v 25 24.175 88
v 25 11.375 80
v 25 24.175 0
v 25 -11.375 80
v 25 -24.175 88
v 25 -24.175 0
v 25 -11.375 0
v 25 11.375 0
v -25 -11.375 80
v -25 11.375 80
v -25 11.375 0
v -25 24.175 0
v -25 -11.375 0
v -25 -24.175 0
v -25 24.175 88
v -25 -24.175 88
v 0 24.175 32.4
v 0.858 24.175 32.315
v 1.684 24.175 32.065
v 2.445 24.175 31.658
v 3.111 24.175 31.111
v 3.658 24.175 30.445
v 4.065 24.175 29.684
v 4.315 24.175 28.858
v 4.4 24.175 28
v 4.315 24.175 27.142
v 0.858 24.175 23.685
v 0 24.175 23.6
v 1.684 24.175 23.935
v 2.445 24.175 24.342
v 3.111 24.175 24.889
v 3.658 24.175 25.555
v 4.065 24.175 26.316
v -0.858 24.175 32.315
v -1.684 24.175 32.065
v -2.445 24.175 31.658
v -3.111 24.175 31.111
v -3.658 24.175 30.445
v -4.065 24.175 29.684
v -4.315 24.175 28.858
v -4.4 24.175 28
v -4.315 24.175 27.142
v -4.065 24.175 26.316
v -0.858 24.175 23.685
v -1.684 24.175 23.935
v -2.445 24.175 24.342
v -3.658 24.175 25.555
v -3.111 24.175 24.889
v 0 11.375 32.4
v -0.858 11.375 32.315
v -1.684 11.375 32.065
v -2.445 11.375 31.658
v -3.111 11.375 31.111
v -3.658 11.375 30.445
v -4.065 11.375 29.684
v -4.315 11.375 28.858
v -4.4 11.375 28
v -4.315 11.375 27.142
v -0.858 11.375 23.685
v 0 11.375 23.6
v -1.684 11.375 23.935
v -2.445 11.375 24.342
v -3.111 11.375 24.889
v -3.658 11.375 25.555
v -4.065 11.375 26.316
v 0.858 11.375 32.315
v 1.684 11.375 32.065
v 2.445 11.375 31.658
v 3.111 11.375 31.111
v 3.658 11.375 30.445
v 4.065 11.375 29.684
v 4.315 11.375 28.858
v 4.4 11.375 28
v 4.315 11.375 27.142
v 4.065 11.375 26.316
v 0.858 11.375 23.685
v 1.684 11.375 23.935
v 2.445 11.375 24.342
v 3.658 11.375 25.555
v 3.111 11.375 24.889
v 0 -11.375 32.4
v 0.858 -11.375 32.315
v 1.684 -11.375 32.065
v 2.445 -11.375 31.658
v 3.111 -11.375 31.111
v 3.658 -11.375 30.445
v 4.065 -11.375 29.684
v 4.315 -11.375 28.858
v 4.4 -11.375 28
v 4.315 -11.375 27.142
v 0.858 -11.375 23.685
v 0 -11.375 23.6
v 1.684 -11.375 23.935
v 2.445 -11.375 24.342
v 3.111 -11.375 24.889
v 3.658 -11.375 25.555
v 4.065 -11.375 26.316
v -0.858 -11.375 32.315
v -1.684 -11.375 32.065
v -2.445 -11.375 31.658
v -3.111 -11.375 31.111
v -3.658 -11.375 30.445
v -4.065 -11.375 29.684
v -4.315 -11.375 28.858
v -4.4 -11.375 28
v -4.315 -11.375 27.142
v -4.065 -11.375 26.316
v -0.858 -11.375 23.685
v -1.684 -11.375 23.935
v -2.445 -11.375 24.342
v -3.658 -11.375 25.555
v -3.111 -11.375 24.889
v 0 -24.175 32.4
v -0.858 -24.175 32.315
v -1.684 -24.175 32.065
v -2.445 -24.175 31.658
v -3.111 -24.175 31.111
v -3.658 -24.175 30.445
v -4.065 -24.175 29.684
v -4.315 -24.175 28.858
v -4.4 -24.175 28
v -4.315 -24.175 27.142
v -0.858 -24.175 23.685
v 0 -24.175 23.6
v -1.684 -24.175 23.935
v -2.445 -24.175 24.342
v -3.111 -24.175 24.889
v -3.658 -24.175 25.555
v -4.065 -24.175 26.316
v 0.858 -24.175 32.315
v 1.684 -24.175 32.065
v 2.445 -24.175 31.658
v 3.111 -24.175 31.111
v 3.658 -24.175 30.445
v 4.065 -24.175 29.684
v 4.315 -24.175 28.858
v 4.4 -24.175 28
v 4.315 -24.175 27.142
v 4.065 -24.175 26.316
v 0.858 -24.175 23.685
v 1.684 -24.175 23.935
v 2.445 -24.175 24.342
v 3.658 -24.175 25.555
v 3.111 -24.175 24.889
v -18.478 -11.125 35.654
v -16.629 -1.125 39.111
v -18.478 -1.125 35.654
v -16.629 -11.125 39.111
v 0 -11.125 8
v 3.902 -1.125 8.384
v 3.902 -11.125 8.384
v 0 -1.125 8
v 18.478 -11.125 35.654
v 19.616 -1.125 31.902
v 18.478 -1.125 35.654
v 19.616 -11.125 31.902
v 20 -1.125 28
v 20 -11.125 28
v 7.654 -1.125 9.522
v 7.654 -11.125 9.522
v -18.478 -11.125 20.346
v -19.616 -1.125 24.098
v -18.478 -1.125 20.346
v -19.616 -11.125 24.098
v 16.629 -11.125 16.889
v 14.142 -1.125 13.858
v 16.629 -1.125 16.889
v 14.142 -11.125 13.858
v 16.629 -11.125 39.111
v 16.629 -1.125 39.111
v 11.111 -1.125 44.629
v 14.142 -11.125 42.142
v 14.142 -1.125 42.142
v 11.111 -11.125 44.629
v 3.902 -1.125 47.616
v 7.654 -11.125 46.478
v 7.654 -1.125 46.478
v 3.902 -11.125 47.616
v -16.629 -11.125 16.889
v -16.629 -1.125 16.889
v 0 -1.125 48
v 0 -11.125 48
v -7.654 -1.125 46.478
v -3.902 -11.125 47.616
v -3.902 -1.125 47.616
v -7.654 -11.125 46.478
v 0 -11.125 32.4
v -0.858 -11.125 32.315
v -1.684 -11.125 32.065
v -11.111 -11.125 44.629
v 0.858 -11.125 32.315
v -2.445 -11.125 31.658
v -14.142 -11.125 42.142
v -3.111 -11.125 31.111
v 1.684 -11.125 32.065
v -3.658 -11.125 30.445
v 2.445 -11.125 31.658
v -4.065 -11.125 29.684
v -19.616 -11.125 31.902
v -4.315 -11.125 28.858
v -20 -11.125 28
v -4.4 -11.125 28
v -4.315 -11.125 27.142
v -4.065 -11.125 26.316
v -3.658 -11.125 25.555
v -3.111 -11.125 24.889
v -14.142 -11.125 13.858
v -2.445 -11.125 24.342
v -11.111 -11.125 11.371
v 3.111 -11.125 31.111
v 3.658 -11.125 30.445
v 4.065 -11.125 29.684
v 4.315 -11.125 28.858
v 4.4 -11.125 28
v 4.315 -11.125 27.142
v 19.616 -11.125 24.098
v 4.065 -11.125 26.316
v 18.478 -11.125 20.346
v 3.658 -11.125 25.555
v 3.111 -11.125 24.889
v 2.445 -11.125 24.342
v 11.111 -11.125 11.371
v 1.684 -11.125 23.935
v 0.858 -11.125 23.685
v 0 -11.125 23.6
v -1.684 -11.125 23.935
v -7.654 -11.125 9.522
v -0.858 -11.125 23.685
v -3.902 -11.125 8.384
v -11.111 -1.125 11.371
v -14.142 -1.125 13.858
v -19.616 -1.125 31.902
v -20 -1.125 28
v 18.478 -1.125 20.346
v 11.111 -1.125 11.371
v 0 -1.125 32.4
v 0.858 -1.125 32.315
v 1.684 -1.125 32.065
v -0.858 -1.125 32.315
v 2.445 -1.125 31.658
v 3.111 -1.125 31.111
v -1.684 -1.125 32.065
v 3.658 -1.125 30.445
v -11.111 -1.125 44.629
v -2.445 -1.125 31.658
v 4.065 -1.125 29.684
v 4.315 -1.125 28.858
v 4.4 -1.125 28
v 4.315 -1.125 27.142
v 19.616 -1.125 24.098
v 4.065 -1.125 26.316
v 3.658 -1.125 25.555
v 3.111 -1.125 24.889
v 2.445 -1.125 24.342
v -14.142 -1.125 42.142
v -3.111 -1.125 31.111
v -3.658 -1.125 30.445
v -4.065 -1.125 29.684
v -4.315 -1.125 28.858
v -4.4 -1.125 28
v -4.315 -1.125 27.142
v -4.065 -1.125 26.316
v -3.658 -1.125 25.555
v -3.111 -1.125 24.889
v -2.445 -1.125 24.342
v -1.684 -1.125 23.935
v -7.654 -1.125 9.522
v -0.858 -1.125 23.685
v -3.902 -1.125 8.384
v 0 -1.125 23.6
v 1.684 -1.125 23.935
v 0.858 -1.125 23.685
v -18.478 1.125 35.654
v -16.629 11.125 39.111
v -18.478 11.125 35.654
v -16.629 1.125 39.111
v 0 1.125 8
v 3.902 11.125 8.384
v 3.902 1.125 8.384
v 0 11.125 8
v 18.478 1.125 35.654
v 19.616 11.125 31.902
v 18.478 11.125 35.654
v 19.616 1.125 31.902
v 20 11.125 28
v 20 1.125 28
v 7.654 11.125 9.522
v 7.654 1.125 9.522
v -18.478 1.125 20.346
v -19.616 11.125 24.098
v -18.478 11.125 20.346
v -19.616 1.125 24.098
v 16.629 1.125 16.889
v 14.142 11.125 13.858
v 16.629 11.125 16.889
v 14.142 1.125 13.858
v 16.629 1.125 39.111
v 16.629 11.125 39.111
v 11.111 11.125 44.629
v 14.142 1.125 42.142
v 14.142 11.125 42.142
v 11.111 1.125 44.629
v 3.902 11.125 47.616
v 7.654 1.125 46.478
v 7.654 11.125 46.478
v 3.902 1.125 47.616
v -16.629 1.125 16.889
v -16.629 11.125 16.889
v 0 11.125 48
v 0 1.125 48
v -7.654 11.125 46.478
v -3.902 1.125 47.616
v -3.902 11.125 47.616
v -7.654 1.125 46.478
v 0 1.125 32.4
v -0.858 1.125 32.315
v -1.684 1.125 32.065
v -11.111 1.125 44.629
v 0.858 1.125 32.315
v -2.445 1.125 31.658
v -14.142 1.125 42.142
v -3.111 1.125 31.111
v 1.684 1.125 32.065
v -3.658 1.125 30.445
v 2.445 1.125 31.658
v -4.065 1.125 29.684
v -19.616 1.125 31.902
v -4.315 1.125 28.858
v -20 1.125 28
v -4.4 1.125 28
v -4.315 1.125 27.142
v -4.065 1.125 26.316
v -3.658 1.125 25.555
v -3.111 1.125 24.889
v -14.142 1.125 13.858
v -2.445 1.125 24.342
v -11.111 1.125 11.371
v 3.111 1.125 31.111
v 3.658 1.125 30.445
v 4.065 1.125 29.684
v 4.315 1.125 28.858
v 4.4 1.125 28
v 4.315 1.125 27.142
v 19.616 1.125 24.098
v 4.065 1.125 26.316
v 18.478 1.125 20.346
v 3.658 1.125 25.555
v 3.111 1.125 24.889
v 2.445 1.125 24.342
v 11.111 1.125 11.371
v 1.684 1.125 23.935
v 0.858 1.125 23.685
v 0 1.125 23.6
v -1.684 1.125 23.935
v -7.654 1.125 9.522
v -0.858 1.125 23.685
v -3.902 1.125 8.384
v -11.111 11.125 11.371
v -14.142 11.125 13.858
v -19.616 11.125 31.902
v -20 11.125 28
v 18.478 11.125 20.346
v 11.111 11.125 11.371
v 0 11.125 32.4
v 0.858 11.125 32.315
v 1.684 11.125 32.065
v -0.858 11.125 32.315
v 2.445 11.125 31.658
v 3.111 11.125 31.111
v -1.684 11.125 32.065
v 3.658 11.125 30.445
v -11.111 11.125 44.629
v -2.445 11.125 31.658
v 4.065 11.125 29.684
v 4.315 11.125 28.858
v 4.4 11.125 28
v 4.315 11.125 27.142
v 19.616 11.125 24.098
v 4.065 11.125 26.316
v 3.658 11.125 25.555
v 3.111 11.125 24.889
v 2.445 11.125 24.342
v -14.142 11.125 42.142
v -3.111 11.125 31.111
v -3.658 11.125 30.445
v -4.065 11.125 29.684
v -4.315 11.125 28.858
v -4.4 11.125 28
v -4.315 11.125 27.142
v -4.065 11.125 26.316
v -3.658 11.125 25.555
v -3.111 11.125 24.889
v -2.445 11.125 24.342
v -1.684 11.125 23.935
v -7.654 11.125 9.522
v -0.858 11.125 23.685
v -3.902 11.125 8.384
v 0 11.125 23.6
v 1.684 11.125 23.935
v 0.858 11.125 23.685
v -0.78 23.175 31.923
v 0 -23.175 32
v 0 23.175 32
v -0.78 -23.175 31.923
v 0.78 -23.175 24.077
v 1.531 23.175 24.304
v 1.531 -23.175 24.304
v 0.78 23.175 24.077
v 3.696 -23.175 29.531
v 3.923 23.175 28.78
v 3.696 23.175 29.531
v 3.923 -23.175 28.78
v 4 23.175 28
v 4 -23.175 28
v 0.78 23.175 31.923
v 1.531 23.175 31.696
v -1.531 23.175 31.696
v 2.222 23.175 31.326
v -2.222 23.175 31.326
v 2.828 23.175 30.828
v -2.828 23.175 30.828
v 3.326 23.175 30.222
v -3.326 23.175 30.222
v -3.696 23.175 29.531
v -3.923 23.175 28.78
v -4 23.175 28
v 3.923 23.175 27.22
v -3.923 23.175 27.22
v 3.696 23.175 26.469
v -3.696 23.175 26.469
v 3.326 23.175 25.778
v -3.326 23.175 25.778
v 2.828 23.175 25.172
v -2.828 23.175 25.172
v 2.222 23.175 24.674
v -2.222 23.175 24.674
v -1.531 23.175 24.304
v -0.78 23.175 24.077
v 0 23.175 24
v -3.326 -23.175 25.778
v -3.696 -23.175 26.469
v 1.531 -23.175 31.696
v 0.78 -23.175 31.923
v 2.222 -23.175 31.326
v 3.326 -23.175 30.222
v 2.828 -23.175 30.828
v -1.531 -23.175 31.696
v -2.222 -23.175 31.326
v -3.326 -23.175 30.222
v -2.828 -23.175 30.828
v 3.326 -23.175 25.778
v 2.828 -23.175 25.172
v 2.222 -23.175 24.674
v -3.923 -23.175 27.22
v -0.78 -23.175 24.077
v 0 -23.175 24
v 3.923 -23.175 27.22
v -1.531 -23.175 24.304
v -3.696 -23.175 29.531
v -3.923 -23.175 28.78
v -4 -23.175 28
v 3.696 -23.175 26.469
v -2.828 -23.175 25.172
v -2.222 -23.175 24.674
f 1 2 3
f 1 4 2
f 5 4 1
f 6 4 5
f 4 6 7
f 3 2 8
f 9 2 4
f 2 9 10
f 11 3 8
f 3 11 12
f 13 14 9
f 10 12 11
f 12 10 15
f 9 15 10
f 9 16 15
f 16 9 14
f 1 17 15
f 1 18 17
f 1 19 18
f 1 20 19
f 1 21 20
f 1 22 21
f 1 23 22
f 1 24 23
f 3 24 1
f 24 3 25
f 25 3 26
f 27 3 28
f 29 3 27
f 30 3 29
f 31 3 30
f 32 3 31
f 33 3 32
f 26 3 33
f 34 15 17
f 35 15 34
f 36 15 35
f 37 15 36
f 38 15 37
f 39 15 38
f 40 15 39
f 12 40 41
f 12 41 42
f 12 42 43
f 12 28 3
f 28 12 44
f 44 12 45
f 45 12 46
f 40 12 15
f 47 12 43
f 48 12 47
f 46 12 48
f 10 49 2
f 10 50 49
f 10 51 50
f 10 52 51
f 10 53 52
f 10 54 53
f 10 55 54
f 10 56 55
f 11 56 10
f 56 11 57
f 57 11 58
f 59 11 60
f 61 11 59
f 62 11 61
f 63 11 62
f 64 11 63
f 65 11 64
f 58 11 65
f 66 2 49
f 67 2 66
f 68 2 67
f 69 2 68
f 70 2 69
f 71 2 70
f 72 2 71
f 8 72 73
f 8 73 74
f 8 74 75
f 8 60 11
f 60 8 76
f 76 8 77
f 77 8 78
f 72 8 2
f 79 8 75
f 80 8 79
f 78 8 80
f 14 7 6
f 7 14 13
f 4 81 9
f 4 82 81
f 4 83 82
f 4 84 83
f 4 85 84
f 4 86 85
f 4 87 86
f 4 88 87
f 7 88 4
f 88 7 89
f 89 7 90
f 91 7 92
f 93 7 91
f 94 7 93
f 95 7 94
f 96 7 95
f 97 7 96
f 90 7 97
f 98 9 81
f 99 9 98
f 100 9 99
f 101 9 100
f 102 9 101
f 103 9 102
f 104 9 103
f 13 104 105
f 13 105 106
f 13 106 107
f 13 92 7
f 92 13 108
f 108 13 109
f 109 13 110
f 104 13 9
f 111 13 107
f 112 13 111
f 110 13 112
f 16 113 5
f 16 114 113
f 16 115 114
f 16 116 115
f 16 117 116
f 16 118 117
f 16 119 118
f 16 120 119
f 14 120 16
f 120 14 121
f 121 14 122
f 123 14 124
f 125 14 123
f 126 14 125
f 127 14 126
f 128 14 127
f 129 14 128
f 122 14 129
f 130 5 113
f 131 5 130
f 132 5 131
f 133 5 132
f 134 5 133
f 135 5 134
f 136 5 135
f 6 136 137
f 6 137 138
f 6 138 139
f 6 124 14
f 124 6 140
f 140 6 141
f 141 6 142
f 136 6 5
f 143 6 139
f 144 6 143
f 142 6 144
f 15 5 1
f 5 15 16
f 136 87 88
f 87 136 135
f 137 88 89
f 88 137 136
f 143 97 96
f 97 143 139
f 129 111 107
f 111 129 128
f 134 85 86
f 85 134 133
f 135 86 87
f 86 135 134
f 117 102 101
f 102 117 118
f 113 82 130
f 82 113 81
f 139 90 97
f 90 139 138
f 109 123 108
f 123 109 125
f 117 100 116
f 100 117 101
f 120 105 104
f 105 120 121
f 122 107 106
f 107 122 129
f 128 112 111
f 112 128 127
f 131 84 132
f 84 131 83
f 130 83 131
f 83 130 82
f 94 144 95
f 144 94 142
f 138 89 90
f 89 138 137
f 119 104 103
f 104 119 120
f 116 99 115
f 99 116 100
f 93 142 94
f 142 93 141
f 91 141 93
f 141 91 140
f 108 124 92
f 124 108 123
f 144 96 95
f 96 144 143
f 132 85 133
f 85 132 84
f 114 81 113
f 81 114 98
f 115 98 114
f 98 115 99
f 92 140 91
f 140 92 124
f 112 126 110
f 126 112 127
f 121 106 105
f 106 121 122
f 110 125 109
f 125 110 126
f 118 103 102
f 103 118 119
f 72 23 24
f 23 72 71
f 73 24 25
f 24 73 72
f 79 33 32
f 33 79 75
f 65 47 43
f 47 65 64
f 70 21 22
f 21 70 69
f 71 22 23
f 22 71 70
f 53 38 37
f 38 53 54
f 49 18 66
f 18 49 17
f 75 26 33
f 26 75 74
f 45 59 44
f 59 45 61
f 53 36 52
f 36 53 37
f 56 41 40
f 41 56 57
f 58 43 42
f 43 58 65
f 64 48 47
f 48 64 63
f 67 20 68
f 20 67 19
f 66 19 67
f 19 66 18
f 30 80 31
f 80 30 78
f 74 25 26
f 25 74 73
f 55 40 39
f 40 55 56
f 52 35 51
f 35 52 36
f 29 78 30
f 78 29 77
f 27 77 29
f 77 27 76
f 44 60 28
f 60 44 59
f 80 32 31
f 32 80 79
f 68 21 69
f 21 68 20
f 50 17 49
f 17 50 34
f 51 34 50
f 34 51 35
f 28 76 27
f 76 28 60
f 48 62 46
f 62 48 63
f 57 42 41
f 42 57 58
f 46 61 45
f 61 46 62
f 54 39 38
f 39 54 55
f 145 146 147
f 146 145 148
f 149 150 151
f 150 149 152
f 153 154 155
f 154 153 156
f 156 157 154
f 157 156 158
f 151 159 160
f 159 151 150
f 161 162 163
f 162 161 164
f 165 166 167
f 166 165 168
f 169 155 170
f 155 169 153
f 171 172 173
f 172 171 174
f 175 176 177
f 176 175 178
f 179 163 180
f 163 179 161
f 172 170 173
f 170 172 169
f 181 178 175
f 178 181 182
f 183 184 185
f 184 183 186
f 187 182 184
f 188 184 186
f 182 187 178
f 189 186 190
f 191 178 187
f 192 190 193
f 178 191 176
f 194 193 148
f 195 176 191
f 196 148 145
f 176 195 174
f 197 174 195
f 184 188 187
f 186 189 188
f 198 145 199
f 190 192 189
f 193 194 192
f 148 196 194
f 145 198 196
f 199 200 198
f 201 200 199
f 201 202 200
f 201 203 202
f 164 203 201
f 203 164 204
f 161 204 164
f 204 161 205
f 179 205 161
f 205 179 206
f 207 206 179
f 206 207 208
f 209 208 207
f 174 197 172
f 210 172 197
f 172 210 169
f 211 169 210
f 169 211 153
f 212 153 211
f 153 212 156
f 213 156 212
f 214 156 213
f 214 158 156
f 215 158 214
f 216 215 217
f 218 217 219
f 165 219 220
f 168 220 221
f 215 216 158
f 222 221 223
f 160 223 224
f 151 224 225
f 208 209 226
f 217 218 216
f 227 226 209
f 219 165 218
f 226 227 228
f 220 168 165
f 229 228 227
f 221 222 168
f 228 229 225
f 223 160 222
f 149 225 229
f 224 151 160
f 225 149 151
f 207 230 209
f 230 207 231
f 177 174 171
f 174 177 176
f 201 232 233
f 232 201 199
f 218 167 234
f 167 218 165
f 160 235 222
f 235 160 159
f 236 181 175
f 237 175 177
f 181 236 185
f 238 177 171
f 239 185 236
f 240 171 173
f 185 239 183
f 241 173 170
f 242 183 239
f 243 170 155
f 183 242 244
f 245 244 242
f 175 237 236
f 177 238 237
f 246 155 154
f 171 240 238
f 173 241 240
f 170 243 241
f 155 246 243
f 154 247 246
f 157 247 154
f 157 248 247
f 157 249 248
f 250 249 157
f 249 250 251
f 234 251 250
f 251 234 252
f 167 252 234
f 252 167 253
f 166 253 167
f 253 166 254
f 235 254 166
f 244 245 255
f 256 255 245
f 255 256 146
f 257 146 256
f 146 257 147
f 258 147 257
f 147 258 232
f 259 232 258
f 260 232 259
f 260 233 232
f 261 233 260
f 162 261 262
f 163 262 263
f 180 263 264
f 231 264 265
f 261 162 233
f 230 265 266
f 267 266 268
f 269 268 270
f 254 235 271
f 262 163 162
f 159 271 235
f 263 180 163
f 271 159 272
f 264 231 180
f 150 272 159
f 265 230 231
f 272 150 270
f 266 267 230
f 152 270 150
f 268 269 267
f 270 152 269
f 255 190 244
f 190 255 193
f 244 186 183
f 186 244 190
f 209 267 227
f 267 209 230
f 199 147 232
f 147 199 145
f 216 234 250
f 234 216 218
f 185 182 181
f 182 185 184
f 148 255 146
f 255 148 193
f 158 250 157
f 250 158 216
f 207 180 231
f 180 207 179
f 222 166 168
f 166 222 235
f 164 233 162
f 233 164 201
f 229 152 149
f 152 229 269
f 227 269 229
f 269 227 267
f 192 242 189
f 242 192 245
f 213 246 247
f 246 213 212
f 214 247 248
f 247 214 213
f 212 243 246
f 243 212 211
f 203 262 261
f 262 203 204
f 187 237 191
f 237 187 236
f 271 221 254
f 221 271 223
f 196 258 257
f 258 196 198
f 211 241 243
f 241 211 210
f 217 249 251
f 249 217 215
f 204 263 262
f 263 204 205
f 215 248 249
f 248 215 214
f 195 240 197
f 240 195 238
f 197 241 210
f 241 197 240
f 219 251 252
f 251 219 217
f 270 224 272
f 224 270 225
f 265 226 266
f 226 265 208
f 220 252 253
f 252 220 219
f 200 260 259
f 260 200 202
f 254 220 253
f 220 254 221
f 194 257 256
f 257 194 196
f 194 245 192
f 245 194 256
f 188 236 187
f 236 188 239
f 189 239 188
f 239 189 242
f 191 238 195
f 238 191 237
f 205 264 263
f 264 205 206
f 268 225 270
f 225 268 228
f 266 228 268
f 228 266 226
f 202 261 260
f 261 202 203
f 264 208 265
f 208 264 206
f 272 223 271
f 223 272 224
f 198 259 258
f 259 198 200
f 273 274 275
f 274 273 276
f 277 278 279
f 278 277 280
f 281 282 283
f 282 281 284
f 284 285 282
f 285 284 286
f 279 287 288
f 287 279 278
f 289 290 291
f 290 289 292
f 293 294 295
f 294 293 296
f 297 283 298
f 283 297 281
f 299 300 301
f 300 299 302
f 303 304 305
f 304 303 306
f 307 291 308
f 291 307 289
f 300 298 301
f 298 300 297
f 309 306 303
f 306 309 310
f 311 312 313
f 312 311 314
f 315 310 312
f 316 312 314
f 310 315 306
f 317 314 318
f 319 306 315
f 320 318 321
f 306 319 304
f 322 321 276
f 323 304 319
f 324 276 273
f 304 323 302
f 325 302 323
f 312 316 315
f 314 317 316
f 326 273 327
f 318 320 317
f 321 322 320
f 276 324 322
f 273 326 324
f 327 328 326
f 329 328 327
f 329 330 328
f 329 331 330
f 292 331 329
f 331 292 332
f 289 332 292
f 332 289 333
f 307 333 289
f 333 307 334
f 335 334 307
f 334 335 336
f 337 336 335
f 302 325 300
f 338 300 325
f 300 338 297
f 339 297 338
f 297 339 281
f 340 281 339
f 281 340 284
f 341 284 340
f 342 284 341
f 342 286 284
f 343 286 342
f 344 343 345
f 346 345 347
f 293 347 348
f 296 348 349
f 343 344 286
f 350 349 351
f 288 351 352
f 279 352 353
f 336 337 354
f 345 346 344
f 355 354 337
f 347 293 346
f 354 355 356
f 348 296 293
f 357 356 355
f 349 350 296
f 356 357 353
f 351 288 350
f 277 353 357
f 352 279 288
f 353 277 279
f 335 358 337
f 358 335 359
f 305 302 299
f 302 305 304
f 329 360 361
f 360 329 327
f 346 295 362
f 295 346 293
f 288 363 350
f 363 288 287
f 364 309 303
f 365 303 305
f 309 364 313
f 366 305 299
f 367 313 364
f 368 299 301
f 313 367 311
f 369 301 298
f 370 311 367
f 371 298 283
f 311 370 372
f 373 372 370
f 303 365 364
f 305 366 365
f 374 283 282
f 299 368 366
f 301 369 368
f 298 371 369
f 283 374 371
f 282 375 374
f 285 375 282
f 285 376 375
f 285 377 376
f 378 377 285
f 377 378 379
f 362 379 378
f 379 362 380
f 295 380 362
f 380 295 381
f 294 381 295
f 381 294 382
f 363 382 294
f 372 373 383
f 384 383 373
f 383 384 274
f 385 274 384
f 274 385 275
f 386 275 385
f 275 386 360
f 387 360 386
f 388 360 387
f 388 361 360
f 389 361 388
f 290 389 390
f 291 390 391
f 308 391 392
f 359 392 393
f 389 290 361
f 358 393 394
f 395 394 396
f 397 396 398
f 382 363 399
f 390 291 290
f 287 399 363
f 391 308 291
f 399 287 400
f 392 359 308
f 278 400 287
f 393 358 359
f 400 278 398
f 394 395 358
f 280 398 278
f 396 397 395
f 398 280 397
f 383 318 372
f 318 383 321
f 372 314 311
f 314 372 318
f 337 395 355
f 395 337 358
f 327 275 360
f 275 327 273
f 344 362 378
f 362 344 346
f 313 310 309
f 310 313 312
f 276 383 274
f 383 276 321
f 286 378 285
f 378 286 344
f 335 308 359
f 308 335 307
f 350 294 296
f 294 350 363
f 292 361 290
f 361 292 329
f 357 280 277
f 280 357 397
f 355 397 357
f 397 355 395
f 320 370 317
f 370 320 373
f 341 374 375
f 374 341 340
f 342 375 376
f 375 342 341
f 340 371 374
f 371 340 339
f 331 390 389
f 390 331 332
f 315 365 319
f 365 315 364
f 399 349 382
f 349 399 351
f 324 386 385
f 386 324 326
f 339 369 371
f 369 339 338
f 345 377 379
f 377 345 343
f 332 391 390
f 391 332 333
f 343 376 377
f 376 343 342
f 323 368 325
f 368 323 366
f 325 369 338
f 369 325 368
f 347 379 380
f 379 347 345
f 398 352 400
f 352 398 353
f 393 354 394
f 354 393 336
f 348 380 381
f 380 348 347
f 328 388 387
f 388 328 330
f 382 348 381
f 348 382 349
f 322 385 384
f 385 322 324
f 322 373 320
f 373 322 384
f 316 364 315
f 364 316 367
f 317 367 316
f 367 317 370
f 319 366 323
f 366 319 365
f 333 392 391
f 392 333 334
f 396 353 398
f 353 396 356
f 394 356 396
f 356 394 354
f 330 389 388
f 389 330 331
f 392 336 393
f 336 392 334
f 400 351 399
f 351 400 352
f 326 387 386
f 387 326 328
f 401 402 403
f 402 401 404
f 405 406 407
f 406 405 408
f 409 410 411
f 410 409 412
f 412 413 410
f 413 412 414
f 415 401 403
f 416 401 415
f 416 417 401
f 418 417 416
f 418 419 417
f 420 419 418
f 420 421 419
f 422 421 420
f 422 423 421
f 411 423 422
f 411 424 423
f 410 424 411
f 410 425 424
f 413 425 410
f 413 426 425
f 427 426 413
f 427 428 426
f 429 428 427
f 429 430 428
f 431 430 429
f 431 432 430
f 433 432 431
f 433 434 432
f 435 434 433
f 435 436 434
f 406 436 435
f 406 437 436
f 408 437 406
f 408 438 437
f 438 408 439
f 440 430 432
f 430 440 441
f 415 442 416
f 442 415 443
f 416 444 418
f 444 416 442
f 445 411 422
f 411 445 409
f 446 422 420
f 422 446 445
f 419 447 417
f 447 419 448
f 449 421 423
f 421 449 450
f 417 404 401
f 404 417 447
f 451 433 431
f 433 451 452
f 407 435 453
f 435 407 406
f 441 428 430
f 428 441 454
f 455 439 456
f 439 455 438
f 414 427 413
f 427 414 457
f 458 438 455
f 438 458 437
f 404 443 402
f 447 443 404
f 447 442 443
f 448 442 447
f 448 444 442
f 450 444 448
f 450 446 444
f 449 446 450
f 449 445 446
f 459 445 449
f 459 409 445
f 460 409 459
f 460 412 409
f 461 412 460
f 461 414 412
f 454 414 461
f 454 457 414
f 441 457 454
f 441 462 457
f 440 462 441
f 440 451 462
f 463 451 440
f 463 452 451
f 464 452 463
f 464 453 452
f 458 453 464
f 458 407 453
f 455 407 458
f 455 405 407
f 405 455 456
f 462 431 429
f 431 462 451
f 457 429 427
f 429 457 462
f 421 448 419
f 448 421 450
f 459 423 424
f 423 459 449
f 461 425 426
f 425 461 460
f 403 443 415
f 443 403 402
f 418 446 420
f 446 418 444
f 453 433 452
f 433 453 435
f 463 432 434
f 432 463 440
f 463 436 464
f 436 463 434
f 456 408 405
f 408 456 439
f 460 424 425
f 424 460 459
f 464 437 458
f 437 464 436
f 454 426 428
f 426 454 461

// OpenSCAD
$fn = 32;

// ------------------------------------------------------------------------
// Trolley wheel set: wheels d40, fork 80 mm tall
// Every part is its own module, assembly() places every instance.
// ------------------------------------------------------------------------

// --- part 1 ---
module trolley_fork() {
  difference() {
    union() {
      translate([-25, 11.375, 0]) cube([50, 12.8, 80]);
      translate([-25, -24.175, 0]) cube([50, 12.8, 80]);
      translate([-25, -24.175, 80]) cube([50, 48.35, 8]);
    }
    translate([0, -17.775, 28]) rotate([90, 0, 0]) cylinder(h = 14.8, d = 8.8, center = true);
    translate([0, 17.775, 28]) rotate([90, 0, 0]) cylinder(h = 14.8, d = 8.8, center = true);
  }
}

// --- part 2 ---
module trolley_wheel() {
  difference() {
      translate([0, 0, 0]) cylinder(h = 10, d = 40);
      translate([0, 0, -1]) cylinder(h = 12, d = 8.8);
    }
}

// --- part 3 ---
module trolley_axle() {
  translate([0, 0, -23.175]) cylinder(h = 46.35, d = 8);
}

// --- assembly ---
module assembly() {
  color([0.80, 0.24, 0.20]) translate([0, 0, 0]) rotate([0, 0, 0]) trolley_fork();
  color([0.20, 0.45, 0.75]) translate([0, -1.125, 28]) rotate([90, 0, 0]) trolley_wheel();
  color([0.25, 0.62, 0.32]) translate([0, 11.125, 28]) rotate([90, 0, 0]) trolley_wheel();
  color([0.92, 0.70, 0.18]) translate([0, 0, 28]) rotate([90, 0, 0]) trolley_axle();
}

assembly();
